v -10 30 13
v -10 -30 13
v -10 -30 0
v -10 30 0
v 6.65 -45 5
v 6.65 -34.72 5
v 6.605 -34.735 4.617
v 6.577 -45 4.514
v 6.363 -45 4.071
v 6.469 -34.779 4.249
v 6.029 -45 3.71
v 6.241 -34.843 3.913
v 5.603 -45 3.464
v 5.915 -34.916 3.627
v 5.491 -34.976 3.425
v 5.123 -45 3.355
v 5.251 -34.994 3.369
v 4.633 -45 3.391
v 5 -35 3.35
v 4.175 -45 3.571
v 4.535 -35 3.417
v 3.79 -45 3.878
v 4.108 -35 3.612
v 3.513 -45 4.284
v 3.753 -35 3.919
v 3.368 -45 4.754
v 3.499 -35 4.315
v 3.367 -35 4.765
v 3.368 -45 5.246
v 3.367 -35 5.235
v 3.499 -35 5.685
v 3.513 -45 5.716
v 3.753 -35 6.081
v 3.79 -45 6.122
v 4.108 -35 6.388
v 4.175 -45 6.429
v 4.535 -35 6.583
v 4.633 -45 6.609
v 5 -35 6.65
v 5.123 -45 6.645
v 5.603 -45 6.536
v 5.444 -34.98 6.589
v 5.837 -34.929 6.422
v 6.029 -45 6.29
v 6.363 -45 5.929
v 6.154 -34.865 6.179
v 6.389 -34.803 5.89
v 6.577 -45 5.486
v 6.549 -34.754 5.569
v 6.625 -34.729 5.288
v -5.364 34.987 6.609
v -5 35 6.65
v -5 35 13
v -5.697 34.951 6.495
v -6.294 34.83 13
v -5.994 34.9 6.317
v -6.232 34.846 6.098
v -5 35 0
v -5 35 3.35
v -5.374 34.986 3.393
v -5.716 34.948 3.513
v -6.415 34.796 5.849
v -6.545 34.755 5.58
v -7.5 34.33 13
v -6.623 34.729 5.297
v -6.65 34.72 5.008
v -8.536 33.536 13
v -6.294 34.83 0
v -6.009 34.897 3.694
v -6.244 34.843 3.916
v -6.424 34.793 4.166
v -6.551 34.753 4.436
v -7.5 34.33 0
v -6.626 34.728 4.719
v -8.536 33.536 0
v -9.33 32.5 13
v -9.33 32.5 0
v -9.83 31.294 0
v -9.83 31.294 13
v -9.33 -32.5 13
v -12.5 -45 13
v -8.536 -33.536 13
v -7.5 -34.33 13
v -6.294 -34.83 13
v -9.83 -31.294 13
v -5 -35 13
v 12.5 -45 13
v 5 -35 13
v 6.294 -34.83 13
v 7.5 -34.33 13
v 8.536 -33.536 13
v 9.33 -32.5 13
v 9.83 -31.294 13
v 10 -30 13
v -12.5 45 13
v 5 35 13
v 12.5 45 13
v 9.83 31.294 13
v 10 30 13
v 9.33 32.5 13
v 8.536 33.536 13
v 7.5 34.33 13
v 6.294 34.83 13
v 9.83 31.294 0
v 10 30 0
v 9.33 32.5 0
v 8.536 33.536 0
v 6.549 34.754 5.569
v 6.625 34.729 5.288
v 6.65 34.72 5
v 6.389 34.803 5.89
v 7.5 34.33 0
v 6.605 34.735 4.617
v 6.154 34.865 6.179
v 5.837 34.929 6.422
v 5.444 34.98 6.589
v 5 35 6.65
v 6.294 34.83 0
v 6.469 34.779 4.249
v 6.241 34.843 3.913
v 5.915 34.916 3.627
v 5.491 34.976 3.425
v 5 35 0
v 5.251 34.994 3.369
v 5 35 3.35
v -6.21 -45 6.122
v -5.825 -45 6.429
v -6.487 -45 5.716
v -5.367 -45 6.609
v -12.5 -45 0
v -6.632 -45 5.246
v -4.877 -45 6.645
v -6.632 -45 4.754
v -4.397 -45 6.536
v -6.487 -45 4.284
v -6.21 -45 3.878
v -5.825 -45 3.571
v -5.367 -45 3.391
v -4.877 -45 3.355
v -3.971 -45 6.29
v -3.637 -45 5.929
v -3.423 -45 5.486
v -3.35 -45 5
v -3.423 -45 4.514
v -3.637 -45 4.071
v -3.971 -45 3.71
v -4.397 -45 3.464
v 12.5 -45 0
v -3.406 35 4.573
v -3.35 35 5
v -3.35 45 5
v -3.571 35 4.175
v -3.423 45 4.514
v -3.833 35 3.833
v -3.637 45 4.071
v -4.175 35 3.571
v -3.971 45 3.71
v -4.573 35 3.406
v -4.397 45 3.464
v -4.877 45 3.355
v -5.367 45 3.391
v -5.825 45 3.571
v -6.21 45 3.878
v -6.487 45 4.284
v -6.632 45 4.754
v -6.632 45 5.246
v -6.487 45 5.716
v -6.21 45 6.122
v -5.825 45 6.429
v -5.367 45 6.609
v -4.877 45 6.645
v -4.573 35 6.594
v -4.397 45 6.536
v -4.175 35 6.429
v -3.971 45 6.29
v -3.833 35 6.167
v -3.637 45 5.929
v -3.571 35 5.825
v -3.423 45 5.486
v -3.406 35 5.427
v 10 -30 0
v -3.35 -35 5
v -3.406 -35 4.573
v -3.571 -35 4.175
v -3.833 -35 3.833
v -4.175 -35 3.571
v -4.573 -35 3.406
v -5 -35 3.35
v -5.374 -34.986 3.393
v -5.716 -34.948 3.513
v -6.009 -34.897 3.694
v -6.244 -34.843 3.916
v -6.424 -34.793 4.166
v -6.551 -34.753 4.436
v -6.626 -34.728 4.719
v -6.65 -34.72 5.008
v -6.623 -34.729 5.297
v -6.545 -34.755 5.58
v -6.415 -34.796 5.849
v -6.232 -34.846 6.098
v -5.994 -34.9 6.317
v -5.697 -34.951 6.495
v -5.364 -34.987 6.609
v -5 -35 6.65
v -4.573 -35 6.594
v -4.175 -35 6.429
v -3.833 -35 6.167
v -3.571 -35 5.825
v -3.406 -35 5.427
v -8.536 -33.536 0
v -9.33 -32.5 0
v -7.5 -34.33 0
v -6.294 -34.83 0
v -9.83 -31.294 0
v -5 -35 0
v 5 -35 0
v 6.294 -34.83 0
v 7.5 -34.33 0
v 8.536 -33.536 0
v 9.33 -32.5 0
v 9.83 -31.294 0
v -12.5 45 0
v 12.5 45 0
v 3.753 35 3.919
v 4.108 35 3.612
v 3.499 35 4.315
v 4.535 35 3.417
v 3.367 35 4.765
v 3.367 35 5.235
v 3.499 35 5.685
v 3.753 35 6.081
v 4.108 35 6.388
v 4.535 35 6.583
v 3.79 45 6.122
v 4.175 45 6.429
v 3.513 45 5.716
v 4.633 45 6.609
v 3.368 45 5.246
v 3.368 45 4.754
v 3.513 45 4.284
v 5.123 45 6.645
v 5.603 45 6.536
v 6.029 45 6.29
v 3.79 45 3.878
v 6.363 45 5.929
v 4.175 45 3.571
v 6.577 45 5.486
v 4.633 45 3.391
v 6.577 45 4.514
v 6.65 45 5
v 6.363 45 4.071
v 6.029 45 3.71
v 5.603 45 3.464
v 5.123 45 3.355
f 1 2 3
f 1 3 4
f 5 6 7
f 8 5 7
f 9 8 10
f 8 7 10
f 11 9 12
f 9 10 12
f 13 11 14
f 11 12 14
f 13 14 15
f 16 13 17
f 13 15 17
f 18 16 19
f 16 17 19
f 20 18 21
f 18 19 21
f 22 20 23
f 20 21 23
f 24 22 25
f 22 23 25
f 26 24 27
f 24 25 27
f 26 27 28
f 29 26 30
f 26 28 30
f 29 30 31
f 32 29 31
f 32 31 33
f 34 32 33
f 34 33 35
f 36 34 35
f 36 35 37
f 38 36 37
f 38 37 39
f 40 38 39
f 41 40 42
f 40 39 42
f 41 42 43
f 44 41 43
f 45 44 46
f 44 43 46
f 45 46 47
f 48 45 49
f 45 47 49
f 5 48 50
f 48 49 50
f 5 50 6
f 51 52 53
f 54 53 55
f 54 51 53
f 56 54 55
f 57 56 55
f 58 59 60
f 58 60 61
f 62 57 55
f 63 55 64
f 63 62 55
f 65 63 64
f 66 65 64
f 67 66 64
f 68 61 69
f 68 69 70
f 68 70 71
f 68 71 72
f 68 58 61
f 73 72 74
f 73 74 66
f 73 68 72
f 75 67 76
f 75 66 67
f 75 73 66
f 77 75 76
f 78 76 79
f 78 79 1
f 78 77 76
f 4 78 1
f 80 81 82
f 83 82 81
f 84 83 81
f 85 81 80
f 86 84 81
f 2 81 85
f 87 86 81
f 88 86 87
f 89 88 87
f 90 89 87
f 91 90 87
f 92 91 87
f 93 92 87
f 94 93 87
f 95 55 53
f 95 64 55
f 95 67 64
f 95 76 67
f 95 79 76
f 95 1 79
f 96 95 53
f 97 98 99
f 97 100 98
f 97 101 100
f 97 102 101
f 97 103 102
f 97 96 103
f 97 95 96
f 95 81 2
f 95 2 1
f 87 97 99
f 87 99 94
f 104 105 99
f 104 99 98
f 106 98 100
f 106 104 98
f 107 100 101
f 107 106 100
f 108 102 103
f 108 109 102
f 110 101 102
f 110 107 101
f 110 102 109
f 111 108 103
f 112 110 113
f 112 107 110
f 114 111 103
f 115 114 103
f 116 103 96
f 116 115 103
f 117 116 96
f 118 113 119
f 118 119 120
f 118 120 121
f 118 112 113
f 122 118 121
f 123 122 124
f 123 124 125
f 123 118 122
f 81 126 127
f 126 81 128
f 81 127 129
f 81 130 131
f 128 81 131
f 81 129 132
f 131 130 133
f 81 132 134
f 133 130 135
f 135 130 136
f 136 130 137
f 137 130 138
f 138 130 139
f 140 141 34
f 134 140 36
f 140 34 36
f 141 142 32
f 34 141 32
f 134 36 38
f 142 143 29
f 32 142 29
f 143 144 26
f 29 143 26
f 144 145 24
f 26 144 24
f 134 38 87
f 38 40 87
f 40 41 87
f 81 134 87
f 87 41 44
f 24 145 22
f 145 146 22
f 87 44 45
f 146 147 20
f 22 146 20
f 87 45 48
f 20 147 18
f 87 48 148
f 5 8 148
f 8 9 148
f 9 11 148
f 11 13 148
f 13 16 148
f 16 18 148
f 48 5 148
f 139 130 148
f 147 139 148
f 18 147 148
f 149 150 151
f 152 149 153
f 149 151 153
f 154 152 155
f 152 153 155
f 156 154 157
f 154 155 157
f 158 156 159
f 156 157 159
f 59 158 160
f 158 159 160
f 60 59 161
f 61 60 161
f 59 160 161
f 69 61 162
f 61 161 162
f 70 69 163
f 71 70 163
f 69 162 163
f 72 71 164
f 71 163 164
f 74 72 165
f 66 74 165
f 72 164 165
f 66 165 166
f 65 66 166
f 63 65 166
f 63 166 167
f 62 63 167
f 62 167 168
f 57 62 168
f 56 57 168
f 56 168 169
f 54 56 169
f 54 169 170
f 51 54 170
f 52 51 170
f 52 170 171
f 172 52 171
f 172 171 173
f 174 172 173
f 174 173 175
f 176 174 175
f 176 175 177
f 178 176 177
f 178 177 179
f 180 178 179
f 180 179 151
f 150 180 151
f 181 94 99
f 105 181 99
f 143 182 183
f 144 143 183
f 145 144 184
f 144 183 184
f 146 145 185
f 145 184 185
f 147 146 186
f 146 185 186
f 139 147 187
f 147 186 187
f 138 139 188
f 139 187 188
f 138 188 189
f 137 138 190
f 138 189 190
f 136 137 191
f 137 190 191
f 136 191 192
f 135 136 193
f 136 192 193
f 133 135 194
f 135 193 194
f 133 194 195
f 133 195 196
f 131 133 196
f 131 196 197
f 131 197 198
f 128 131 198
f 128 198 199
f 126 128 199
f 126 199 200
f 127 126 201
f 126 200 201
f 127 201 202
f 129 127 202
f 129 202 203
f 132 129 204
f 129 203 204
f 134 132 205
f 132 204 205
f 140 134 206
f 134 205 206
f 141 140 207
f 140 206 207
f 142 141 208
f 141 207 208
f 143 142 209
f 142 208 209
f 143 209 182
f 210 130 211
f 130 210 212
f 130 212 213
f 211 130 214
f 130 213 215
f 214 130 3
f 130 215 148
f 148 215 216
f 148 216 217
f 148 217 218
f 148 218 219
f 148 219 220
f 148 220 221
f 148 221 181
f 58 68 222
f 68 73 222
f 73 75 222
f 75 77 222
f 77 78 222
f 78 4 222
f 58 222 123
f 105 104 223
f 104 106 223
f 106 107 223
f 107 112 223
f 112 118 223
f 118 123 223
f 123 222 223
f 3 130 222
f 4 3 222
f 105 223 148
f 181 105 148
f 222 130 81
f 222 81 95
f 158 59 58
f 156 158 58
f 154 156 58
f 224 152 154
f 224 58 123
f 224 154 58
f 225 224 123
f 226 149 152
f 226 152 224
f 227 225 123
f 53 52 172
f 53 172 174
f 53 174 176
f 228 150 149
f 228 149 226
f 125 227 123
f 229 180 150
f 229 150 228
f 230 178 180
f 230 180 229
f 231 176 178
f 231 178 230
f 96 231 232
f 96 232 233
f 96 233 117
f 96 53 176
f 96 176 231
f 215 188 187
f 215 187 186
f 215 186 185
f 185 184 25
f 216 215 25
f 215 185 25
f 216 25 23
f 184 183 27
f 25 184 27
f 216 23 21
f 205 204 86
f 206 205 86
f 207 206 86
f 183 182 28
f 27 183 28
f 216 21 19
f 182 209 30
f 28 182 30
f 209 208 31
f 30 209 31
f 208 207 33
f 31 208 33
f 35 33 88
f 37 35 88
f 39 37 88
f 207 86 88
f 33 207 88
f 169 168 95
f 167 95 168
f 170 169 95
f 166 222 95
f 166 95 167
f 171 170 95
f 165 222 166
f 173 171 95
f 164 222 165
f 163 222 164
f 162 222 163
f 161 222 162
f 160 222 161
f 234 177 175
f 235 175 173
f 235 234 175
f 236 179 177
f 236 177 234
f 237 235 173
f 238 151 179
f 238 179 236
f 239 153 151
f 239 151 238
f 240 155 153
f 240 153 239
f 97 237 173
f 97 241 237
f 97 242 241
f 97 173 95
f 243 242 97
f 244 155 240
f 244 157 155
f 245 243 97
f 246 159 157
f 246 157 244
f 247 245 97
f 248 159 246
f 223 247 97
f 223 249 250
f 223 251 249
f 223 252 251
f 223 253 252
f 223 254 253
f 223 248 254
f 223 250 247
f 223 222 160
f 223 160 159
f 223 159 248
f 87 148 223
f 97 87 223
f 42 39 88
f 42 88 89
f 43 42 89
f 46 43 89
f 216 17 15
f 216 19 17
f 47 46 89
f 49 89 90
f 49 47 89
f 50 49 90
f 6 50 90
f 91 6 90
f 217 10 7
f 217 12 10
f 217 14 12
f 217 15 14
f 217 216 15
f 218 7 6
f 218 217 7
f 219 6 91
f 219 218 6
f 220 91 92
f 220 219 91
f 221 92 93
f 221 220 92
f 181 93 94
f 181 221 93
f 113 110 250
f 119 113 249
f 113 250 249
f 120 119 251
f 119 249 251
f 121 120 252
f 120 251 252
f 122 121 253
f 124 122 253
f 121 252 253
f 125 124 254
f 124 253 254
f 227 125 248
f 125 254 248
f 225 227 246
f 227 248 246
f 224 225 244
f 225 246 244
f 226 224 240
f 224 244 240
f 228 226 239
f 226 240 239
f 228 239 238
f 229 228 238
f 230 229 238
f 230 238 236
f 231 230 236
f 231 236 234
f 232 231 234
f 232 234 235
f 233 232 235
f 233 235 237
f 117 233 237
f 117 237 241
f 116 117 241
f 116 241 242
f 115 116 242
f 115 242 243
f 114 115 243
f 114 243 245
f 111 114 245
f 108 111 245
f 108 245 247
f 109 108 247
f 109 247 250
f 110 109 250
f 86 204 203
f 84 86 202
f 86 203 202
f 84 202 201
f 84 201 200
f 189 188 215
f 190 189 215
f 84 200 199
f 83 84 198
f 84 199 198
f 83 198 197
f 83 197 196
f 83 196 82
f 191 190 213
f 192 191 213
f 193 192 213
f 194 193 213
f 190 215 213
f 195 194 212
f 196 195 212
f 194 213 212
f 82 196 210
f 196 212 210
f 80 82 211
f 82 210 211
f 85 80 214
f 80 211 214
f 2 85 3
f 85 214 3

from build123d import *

# Parameters (mm, degrees)
SKETCH1_W             = 25
SKETCH1_H             = 90
BOSS_EXTRUDE1_DEPTH   = 13
SKETCH2_W             = 20
SKETCH2_H             = 70
CUT_EXTRUDE1_DEPTH    = 23
FILLET1_R             = 5
M4X0_7_TAPPED_HOLE1_D = 3.3


with BuildPart() as part:
    # Sketch1 → Boss-Extrude1 (new body)
    with BuildSketch(Plane.XY):
        Rectangle(SKETCH1_W, SKETCH1_H)
    extrude(amount=BOSS_EXTRUDE1_DEPTH)

    # Sketch2 → Cut-Extrude1 (cut)
    with BuildSketch(Plane.XY.offset(13)):
        Rectangle(SKETCH2_W, SKETCH2_H)
    extrude(amount=-CUT_EXTRUDE1_DEPTH, mode=Mode.SUBTRACT)

    # Fillet1
    fillet1_edges = [part.edges().sort_by_distance(p)[0] for p in [
        (10, 35, 6.5),
        (10, -35, 6.5),
        (-10, -35, 6.5),
        (-10, 35, 6.5),
    ]]
    fillet(fillet1_edges, radius=FILLET1_R)

    # M4x0.7 Tapped Hole1 (through all)
    with Locations(Plane(origin=(0, -45, 0), x_dir=(-1, 0, 0), z_dir=(0, -1, 0))):
        with Locations((-5, -5), (5, -5)):
            Hole(M4X0_7_TAPPED_HOLE1_D / 2)


solid = part.part
